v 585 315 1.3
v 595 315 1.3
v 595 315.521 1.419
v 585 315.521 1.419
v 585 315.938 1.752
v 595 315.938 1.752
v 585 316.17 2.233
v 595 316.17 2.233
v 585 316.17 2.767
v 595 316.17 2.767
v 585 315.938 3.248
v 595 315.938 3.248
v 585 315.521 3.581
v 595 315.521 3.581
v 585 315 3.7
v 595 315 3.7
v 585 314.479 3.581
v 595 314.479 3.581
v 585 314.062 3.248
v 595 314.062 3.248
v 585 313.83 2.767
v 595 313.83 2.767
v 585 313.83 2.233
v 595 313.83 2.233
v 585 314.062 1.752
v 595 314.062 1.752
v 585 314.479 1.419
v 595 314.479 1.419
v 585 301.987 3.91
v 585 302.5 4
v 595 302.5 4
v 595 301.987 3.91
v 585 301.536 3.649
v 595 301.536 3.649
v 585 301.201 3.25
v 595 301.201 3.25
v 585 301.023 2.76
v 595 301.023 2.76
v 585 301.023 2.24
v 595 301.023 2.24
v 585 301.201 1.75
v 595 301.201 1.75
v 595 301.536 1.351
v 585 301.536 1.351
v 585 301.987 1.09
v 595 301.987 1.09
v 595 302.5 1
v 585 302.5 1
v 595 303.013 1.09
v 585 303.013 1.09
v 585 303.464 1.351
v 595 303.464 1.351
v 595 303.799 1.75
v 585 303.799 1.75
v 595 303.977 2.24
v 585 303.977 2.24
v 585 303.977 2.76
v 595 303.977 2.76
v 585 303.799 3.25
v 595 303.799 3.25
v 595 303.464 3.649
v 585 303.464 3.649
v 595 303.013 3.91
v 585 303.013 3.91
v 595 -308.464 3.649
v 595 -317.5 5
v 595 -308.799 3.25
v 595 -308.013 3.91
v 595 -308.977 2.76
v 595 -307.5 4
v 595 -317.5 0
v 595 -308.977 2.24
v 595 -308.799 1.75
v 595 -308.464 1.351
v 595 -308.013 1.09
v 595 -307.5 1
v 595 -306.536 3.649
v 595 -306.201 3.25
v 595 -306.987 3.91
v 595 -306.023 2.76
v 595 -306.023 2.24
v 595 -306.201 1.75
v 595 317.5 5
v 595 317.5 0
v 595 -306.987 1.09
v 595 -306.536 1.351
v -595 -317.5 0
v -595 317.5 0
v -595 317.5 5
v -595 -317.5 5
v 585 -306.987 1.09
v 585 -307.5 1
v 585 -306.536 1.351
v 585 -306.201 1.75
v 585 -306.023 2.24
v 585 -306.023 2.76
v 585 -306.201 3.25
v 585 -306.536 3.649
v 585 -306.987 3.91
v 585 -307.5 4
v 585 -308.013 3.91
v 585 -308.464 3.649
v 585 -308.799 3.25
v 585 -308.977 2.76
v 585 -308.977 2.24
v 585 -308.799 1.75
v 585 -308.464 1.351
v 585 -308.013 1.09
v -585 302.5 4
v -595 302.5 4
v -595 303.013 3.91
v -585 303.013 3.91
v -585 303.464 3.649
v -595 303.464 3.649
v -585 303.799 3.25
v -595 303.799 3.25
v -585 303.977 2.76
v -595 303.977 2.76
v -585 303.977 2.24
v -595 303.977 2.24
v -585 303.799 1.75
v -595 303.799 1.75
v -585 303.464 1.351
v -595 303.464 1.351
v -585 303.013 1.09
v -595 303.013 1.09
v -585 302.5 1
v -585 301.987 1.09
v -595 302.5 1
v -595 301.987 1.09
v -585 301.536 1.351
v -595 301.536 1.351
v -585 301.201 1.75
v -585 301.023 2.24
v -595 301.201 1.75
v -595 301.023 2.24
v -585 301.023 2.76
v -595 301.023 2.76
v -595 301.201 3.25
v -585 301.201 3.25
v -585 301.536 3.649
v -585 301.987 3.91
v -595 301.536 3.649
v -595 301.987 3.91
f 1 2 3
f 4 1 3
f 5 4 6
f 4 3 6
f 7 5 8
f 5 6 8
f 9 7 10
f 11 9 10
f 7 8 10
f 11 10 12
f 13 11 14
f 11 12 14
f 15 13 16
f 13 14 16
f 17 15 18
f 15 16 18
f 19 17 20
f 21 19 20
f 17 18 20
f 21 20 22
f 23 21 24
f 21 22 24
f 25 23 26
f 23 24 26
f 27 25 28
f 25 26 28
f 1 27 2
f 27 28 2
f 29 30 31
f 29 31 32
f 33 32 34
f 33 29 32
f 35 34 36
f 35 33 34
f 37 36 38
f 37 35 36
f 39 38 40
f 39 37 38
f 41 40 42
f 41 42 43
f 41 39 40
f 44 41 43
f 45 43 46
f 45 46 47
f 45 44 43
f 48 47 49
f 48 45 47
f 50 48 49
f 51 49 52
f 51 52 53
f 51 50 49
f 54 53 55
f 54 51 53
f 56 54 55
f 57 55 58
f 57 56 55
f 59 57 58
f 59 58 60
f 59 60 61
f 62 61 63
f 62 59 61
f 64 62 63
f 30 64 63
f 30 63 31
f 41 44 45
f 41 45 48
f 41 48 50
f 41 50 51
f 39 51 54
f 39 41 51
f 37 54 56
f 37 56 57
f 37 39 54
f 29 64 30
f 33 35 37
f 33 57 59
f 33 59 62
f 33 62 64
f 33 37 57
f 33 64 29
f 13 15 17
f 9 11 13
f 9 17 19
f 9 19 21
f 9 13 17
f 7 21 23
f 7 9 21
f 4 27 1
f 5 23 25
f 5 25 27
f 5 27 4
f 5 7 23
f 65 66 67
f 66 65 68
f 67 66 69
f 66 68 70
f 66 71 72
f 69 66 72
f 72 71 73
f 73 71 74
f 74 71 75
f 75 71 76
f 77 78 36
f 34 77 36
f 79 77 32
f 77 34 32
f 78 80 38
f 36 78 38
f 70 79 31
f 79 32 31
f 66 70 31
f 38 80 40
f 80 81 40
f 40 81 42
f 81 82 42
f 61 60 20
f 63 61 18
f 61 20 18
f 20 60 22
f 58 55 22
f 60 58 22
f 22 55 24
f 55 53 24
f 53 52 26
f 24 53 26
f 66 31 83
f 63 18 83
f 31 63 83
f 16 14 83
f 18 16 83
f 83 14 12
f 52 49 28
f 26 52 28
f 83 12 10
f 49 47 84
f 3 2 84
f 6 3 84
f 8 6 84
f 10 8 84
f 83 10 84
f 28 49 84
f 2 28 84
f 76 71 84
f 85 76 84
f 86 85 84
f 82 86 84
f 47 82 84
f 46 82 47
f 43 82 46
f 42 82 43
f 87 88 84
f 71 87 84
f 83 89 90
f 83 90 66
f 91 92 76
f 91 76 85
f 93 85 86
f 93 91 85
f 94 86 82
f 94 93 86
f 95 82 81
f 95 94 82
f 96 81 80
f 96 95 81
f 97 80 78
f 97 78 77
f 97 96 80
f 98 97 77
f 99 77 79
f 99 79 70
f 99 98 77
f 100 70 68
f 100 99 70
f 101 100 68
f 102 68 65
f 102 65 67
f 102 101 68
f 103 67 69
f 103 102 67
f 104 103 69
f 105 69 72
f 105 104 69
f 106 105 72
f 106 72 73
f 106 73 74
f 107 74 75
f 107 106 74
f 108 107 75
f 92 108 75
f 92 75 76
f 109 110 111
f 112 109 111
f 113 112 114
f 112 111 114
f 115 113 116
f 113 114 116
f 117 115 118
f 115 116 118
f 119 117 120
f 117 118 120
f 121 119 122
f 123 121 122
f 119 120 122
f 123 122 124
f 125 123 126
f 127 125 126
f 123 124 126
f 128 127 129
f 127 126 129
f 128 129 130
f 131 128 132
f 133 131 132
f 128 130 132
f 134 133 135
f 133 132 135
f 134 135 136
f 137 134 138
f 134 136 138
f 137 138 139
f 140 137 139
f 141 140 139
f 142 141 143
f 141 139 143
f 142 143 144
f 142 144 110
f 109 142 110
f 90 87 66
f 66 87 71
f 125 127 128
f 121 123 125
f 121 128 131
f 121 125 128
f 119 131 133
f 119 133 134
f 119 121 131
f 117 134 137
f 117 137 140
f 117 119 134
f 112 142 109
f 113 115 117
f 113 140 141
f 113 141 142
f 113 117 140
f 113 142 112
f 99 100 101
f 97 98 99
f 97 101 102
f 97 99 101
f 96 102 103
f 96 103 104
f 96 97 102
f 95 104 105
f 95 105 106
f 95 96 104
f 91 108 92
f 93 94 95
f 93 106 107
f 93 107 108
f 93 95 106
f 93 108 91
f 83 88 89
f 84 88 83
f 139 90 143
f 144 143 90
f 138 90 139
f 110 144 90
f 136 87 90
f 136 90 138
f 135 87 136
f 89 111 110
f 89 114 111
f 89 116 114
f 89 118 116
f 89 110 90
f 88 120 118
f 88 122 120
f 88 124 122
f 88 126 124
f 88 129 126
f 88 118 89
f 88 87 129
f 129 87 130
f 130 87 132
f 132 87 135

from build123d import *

# Parameters (mm, degrees)
SKETCH1_W           = 1190
SKETCH1_H           = 635
BOSS_EXTRUDE1_DEPTH = 5
SKETCH2_R           = 1.2
SKETCH2_R_2         = 1.5
CUT_EXTRUDE1_DEPTH  = 10
CUT_EXTRUDE2_START  = -10
SKETCH4_R           = 1.5
CUT_EXTRUDE2_DEPTH  = 10
SKETCH5_R           = 1.2
CUT_EXTRUDE3_DEPTH  = 10


with BuildPart() as part:
    # Sketch1 → Boss-Extrude1 (new body)
    with BuildSketch(Plane.XY):
        Rectangle(SKETCH1_W, SKETCH1_H)
    extrude(amount=BOSS_EXTRUDE1_DEPTH)

    # Sketch2 → Cut-Extrude1 (cut)
    with BuildSketch(Plane.ZY.offset(595)):
        with Locations((2.5, -320)):
            Circle(SKETCH2_R)
        with Locations((2.5, 302.5)):
            Circle(SKETCH2_R_2)
    extrude(amount=-CUT_EXTRUDE1_DEPTH, mode=Mode.SUBTRACT)

    # Sketch4 → Cut-Extrude2 (cut)
    with BuildSketch(Plane(origin=(595, 0, 0), x_dir=(0, 0, -1), z_dir=(1, 0, 0)).offset(CUT_EXTRUDE2_START)):
        with Locations(Location((-2.5, 302.5, 0), (0, 0, 180))):
            Circle(SKETCH4_R)
        with Locations((-2.5, -307.5)):
            Circle(SKETCH4_R)
    extrude(amount=CUT_EXTRUDE2_DEPTH, mode=Mode.SUBTRACT)

    # Sketch5 → Cut-Extrude3 (cut)
    with BuildSketch(Plane(origin=(595, 0, 0), x_dir=(0, 0, -1), z_dir=(1, 0, 0))):
        with Locations((-2.5, 315)):
            Circle(SKETCH5_R)
    extrude(amount=-CUT_EXTRUDE3_DEPTH, mode=Mode.SUBTRACT)


solid = part.part
